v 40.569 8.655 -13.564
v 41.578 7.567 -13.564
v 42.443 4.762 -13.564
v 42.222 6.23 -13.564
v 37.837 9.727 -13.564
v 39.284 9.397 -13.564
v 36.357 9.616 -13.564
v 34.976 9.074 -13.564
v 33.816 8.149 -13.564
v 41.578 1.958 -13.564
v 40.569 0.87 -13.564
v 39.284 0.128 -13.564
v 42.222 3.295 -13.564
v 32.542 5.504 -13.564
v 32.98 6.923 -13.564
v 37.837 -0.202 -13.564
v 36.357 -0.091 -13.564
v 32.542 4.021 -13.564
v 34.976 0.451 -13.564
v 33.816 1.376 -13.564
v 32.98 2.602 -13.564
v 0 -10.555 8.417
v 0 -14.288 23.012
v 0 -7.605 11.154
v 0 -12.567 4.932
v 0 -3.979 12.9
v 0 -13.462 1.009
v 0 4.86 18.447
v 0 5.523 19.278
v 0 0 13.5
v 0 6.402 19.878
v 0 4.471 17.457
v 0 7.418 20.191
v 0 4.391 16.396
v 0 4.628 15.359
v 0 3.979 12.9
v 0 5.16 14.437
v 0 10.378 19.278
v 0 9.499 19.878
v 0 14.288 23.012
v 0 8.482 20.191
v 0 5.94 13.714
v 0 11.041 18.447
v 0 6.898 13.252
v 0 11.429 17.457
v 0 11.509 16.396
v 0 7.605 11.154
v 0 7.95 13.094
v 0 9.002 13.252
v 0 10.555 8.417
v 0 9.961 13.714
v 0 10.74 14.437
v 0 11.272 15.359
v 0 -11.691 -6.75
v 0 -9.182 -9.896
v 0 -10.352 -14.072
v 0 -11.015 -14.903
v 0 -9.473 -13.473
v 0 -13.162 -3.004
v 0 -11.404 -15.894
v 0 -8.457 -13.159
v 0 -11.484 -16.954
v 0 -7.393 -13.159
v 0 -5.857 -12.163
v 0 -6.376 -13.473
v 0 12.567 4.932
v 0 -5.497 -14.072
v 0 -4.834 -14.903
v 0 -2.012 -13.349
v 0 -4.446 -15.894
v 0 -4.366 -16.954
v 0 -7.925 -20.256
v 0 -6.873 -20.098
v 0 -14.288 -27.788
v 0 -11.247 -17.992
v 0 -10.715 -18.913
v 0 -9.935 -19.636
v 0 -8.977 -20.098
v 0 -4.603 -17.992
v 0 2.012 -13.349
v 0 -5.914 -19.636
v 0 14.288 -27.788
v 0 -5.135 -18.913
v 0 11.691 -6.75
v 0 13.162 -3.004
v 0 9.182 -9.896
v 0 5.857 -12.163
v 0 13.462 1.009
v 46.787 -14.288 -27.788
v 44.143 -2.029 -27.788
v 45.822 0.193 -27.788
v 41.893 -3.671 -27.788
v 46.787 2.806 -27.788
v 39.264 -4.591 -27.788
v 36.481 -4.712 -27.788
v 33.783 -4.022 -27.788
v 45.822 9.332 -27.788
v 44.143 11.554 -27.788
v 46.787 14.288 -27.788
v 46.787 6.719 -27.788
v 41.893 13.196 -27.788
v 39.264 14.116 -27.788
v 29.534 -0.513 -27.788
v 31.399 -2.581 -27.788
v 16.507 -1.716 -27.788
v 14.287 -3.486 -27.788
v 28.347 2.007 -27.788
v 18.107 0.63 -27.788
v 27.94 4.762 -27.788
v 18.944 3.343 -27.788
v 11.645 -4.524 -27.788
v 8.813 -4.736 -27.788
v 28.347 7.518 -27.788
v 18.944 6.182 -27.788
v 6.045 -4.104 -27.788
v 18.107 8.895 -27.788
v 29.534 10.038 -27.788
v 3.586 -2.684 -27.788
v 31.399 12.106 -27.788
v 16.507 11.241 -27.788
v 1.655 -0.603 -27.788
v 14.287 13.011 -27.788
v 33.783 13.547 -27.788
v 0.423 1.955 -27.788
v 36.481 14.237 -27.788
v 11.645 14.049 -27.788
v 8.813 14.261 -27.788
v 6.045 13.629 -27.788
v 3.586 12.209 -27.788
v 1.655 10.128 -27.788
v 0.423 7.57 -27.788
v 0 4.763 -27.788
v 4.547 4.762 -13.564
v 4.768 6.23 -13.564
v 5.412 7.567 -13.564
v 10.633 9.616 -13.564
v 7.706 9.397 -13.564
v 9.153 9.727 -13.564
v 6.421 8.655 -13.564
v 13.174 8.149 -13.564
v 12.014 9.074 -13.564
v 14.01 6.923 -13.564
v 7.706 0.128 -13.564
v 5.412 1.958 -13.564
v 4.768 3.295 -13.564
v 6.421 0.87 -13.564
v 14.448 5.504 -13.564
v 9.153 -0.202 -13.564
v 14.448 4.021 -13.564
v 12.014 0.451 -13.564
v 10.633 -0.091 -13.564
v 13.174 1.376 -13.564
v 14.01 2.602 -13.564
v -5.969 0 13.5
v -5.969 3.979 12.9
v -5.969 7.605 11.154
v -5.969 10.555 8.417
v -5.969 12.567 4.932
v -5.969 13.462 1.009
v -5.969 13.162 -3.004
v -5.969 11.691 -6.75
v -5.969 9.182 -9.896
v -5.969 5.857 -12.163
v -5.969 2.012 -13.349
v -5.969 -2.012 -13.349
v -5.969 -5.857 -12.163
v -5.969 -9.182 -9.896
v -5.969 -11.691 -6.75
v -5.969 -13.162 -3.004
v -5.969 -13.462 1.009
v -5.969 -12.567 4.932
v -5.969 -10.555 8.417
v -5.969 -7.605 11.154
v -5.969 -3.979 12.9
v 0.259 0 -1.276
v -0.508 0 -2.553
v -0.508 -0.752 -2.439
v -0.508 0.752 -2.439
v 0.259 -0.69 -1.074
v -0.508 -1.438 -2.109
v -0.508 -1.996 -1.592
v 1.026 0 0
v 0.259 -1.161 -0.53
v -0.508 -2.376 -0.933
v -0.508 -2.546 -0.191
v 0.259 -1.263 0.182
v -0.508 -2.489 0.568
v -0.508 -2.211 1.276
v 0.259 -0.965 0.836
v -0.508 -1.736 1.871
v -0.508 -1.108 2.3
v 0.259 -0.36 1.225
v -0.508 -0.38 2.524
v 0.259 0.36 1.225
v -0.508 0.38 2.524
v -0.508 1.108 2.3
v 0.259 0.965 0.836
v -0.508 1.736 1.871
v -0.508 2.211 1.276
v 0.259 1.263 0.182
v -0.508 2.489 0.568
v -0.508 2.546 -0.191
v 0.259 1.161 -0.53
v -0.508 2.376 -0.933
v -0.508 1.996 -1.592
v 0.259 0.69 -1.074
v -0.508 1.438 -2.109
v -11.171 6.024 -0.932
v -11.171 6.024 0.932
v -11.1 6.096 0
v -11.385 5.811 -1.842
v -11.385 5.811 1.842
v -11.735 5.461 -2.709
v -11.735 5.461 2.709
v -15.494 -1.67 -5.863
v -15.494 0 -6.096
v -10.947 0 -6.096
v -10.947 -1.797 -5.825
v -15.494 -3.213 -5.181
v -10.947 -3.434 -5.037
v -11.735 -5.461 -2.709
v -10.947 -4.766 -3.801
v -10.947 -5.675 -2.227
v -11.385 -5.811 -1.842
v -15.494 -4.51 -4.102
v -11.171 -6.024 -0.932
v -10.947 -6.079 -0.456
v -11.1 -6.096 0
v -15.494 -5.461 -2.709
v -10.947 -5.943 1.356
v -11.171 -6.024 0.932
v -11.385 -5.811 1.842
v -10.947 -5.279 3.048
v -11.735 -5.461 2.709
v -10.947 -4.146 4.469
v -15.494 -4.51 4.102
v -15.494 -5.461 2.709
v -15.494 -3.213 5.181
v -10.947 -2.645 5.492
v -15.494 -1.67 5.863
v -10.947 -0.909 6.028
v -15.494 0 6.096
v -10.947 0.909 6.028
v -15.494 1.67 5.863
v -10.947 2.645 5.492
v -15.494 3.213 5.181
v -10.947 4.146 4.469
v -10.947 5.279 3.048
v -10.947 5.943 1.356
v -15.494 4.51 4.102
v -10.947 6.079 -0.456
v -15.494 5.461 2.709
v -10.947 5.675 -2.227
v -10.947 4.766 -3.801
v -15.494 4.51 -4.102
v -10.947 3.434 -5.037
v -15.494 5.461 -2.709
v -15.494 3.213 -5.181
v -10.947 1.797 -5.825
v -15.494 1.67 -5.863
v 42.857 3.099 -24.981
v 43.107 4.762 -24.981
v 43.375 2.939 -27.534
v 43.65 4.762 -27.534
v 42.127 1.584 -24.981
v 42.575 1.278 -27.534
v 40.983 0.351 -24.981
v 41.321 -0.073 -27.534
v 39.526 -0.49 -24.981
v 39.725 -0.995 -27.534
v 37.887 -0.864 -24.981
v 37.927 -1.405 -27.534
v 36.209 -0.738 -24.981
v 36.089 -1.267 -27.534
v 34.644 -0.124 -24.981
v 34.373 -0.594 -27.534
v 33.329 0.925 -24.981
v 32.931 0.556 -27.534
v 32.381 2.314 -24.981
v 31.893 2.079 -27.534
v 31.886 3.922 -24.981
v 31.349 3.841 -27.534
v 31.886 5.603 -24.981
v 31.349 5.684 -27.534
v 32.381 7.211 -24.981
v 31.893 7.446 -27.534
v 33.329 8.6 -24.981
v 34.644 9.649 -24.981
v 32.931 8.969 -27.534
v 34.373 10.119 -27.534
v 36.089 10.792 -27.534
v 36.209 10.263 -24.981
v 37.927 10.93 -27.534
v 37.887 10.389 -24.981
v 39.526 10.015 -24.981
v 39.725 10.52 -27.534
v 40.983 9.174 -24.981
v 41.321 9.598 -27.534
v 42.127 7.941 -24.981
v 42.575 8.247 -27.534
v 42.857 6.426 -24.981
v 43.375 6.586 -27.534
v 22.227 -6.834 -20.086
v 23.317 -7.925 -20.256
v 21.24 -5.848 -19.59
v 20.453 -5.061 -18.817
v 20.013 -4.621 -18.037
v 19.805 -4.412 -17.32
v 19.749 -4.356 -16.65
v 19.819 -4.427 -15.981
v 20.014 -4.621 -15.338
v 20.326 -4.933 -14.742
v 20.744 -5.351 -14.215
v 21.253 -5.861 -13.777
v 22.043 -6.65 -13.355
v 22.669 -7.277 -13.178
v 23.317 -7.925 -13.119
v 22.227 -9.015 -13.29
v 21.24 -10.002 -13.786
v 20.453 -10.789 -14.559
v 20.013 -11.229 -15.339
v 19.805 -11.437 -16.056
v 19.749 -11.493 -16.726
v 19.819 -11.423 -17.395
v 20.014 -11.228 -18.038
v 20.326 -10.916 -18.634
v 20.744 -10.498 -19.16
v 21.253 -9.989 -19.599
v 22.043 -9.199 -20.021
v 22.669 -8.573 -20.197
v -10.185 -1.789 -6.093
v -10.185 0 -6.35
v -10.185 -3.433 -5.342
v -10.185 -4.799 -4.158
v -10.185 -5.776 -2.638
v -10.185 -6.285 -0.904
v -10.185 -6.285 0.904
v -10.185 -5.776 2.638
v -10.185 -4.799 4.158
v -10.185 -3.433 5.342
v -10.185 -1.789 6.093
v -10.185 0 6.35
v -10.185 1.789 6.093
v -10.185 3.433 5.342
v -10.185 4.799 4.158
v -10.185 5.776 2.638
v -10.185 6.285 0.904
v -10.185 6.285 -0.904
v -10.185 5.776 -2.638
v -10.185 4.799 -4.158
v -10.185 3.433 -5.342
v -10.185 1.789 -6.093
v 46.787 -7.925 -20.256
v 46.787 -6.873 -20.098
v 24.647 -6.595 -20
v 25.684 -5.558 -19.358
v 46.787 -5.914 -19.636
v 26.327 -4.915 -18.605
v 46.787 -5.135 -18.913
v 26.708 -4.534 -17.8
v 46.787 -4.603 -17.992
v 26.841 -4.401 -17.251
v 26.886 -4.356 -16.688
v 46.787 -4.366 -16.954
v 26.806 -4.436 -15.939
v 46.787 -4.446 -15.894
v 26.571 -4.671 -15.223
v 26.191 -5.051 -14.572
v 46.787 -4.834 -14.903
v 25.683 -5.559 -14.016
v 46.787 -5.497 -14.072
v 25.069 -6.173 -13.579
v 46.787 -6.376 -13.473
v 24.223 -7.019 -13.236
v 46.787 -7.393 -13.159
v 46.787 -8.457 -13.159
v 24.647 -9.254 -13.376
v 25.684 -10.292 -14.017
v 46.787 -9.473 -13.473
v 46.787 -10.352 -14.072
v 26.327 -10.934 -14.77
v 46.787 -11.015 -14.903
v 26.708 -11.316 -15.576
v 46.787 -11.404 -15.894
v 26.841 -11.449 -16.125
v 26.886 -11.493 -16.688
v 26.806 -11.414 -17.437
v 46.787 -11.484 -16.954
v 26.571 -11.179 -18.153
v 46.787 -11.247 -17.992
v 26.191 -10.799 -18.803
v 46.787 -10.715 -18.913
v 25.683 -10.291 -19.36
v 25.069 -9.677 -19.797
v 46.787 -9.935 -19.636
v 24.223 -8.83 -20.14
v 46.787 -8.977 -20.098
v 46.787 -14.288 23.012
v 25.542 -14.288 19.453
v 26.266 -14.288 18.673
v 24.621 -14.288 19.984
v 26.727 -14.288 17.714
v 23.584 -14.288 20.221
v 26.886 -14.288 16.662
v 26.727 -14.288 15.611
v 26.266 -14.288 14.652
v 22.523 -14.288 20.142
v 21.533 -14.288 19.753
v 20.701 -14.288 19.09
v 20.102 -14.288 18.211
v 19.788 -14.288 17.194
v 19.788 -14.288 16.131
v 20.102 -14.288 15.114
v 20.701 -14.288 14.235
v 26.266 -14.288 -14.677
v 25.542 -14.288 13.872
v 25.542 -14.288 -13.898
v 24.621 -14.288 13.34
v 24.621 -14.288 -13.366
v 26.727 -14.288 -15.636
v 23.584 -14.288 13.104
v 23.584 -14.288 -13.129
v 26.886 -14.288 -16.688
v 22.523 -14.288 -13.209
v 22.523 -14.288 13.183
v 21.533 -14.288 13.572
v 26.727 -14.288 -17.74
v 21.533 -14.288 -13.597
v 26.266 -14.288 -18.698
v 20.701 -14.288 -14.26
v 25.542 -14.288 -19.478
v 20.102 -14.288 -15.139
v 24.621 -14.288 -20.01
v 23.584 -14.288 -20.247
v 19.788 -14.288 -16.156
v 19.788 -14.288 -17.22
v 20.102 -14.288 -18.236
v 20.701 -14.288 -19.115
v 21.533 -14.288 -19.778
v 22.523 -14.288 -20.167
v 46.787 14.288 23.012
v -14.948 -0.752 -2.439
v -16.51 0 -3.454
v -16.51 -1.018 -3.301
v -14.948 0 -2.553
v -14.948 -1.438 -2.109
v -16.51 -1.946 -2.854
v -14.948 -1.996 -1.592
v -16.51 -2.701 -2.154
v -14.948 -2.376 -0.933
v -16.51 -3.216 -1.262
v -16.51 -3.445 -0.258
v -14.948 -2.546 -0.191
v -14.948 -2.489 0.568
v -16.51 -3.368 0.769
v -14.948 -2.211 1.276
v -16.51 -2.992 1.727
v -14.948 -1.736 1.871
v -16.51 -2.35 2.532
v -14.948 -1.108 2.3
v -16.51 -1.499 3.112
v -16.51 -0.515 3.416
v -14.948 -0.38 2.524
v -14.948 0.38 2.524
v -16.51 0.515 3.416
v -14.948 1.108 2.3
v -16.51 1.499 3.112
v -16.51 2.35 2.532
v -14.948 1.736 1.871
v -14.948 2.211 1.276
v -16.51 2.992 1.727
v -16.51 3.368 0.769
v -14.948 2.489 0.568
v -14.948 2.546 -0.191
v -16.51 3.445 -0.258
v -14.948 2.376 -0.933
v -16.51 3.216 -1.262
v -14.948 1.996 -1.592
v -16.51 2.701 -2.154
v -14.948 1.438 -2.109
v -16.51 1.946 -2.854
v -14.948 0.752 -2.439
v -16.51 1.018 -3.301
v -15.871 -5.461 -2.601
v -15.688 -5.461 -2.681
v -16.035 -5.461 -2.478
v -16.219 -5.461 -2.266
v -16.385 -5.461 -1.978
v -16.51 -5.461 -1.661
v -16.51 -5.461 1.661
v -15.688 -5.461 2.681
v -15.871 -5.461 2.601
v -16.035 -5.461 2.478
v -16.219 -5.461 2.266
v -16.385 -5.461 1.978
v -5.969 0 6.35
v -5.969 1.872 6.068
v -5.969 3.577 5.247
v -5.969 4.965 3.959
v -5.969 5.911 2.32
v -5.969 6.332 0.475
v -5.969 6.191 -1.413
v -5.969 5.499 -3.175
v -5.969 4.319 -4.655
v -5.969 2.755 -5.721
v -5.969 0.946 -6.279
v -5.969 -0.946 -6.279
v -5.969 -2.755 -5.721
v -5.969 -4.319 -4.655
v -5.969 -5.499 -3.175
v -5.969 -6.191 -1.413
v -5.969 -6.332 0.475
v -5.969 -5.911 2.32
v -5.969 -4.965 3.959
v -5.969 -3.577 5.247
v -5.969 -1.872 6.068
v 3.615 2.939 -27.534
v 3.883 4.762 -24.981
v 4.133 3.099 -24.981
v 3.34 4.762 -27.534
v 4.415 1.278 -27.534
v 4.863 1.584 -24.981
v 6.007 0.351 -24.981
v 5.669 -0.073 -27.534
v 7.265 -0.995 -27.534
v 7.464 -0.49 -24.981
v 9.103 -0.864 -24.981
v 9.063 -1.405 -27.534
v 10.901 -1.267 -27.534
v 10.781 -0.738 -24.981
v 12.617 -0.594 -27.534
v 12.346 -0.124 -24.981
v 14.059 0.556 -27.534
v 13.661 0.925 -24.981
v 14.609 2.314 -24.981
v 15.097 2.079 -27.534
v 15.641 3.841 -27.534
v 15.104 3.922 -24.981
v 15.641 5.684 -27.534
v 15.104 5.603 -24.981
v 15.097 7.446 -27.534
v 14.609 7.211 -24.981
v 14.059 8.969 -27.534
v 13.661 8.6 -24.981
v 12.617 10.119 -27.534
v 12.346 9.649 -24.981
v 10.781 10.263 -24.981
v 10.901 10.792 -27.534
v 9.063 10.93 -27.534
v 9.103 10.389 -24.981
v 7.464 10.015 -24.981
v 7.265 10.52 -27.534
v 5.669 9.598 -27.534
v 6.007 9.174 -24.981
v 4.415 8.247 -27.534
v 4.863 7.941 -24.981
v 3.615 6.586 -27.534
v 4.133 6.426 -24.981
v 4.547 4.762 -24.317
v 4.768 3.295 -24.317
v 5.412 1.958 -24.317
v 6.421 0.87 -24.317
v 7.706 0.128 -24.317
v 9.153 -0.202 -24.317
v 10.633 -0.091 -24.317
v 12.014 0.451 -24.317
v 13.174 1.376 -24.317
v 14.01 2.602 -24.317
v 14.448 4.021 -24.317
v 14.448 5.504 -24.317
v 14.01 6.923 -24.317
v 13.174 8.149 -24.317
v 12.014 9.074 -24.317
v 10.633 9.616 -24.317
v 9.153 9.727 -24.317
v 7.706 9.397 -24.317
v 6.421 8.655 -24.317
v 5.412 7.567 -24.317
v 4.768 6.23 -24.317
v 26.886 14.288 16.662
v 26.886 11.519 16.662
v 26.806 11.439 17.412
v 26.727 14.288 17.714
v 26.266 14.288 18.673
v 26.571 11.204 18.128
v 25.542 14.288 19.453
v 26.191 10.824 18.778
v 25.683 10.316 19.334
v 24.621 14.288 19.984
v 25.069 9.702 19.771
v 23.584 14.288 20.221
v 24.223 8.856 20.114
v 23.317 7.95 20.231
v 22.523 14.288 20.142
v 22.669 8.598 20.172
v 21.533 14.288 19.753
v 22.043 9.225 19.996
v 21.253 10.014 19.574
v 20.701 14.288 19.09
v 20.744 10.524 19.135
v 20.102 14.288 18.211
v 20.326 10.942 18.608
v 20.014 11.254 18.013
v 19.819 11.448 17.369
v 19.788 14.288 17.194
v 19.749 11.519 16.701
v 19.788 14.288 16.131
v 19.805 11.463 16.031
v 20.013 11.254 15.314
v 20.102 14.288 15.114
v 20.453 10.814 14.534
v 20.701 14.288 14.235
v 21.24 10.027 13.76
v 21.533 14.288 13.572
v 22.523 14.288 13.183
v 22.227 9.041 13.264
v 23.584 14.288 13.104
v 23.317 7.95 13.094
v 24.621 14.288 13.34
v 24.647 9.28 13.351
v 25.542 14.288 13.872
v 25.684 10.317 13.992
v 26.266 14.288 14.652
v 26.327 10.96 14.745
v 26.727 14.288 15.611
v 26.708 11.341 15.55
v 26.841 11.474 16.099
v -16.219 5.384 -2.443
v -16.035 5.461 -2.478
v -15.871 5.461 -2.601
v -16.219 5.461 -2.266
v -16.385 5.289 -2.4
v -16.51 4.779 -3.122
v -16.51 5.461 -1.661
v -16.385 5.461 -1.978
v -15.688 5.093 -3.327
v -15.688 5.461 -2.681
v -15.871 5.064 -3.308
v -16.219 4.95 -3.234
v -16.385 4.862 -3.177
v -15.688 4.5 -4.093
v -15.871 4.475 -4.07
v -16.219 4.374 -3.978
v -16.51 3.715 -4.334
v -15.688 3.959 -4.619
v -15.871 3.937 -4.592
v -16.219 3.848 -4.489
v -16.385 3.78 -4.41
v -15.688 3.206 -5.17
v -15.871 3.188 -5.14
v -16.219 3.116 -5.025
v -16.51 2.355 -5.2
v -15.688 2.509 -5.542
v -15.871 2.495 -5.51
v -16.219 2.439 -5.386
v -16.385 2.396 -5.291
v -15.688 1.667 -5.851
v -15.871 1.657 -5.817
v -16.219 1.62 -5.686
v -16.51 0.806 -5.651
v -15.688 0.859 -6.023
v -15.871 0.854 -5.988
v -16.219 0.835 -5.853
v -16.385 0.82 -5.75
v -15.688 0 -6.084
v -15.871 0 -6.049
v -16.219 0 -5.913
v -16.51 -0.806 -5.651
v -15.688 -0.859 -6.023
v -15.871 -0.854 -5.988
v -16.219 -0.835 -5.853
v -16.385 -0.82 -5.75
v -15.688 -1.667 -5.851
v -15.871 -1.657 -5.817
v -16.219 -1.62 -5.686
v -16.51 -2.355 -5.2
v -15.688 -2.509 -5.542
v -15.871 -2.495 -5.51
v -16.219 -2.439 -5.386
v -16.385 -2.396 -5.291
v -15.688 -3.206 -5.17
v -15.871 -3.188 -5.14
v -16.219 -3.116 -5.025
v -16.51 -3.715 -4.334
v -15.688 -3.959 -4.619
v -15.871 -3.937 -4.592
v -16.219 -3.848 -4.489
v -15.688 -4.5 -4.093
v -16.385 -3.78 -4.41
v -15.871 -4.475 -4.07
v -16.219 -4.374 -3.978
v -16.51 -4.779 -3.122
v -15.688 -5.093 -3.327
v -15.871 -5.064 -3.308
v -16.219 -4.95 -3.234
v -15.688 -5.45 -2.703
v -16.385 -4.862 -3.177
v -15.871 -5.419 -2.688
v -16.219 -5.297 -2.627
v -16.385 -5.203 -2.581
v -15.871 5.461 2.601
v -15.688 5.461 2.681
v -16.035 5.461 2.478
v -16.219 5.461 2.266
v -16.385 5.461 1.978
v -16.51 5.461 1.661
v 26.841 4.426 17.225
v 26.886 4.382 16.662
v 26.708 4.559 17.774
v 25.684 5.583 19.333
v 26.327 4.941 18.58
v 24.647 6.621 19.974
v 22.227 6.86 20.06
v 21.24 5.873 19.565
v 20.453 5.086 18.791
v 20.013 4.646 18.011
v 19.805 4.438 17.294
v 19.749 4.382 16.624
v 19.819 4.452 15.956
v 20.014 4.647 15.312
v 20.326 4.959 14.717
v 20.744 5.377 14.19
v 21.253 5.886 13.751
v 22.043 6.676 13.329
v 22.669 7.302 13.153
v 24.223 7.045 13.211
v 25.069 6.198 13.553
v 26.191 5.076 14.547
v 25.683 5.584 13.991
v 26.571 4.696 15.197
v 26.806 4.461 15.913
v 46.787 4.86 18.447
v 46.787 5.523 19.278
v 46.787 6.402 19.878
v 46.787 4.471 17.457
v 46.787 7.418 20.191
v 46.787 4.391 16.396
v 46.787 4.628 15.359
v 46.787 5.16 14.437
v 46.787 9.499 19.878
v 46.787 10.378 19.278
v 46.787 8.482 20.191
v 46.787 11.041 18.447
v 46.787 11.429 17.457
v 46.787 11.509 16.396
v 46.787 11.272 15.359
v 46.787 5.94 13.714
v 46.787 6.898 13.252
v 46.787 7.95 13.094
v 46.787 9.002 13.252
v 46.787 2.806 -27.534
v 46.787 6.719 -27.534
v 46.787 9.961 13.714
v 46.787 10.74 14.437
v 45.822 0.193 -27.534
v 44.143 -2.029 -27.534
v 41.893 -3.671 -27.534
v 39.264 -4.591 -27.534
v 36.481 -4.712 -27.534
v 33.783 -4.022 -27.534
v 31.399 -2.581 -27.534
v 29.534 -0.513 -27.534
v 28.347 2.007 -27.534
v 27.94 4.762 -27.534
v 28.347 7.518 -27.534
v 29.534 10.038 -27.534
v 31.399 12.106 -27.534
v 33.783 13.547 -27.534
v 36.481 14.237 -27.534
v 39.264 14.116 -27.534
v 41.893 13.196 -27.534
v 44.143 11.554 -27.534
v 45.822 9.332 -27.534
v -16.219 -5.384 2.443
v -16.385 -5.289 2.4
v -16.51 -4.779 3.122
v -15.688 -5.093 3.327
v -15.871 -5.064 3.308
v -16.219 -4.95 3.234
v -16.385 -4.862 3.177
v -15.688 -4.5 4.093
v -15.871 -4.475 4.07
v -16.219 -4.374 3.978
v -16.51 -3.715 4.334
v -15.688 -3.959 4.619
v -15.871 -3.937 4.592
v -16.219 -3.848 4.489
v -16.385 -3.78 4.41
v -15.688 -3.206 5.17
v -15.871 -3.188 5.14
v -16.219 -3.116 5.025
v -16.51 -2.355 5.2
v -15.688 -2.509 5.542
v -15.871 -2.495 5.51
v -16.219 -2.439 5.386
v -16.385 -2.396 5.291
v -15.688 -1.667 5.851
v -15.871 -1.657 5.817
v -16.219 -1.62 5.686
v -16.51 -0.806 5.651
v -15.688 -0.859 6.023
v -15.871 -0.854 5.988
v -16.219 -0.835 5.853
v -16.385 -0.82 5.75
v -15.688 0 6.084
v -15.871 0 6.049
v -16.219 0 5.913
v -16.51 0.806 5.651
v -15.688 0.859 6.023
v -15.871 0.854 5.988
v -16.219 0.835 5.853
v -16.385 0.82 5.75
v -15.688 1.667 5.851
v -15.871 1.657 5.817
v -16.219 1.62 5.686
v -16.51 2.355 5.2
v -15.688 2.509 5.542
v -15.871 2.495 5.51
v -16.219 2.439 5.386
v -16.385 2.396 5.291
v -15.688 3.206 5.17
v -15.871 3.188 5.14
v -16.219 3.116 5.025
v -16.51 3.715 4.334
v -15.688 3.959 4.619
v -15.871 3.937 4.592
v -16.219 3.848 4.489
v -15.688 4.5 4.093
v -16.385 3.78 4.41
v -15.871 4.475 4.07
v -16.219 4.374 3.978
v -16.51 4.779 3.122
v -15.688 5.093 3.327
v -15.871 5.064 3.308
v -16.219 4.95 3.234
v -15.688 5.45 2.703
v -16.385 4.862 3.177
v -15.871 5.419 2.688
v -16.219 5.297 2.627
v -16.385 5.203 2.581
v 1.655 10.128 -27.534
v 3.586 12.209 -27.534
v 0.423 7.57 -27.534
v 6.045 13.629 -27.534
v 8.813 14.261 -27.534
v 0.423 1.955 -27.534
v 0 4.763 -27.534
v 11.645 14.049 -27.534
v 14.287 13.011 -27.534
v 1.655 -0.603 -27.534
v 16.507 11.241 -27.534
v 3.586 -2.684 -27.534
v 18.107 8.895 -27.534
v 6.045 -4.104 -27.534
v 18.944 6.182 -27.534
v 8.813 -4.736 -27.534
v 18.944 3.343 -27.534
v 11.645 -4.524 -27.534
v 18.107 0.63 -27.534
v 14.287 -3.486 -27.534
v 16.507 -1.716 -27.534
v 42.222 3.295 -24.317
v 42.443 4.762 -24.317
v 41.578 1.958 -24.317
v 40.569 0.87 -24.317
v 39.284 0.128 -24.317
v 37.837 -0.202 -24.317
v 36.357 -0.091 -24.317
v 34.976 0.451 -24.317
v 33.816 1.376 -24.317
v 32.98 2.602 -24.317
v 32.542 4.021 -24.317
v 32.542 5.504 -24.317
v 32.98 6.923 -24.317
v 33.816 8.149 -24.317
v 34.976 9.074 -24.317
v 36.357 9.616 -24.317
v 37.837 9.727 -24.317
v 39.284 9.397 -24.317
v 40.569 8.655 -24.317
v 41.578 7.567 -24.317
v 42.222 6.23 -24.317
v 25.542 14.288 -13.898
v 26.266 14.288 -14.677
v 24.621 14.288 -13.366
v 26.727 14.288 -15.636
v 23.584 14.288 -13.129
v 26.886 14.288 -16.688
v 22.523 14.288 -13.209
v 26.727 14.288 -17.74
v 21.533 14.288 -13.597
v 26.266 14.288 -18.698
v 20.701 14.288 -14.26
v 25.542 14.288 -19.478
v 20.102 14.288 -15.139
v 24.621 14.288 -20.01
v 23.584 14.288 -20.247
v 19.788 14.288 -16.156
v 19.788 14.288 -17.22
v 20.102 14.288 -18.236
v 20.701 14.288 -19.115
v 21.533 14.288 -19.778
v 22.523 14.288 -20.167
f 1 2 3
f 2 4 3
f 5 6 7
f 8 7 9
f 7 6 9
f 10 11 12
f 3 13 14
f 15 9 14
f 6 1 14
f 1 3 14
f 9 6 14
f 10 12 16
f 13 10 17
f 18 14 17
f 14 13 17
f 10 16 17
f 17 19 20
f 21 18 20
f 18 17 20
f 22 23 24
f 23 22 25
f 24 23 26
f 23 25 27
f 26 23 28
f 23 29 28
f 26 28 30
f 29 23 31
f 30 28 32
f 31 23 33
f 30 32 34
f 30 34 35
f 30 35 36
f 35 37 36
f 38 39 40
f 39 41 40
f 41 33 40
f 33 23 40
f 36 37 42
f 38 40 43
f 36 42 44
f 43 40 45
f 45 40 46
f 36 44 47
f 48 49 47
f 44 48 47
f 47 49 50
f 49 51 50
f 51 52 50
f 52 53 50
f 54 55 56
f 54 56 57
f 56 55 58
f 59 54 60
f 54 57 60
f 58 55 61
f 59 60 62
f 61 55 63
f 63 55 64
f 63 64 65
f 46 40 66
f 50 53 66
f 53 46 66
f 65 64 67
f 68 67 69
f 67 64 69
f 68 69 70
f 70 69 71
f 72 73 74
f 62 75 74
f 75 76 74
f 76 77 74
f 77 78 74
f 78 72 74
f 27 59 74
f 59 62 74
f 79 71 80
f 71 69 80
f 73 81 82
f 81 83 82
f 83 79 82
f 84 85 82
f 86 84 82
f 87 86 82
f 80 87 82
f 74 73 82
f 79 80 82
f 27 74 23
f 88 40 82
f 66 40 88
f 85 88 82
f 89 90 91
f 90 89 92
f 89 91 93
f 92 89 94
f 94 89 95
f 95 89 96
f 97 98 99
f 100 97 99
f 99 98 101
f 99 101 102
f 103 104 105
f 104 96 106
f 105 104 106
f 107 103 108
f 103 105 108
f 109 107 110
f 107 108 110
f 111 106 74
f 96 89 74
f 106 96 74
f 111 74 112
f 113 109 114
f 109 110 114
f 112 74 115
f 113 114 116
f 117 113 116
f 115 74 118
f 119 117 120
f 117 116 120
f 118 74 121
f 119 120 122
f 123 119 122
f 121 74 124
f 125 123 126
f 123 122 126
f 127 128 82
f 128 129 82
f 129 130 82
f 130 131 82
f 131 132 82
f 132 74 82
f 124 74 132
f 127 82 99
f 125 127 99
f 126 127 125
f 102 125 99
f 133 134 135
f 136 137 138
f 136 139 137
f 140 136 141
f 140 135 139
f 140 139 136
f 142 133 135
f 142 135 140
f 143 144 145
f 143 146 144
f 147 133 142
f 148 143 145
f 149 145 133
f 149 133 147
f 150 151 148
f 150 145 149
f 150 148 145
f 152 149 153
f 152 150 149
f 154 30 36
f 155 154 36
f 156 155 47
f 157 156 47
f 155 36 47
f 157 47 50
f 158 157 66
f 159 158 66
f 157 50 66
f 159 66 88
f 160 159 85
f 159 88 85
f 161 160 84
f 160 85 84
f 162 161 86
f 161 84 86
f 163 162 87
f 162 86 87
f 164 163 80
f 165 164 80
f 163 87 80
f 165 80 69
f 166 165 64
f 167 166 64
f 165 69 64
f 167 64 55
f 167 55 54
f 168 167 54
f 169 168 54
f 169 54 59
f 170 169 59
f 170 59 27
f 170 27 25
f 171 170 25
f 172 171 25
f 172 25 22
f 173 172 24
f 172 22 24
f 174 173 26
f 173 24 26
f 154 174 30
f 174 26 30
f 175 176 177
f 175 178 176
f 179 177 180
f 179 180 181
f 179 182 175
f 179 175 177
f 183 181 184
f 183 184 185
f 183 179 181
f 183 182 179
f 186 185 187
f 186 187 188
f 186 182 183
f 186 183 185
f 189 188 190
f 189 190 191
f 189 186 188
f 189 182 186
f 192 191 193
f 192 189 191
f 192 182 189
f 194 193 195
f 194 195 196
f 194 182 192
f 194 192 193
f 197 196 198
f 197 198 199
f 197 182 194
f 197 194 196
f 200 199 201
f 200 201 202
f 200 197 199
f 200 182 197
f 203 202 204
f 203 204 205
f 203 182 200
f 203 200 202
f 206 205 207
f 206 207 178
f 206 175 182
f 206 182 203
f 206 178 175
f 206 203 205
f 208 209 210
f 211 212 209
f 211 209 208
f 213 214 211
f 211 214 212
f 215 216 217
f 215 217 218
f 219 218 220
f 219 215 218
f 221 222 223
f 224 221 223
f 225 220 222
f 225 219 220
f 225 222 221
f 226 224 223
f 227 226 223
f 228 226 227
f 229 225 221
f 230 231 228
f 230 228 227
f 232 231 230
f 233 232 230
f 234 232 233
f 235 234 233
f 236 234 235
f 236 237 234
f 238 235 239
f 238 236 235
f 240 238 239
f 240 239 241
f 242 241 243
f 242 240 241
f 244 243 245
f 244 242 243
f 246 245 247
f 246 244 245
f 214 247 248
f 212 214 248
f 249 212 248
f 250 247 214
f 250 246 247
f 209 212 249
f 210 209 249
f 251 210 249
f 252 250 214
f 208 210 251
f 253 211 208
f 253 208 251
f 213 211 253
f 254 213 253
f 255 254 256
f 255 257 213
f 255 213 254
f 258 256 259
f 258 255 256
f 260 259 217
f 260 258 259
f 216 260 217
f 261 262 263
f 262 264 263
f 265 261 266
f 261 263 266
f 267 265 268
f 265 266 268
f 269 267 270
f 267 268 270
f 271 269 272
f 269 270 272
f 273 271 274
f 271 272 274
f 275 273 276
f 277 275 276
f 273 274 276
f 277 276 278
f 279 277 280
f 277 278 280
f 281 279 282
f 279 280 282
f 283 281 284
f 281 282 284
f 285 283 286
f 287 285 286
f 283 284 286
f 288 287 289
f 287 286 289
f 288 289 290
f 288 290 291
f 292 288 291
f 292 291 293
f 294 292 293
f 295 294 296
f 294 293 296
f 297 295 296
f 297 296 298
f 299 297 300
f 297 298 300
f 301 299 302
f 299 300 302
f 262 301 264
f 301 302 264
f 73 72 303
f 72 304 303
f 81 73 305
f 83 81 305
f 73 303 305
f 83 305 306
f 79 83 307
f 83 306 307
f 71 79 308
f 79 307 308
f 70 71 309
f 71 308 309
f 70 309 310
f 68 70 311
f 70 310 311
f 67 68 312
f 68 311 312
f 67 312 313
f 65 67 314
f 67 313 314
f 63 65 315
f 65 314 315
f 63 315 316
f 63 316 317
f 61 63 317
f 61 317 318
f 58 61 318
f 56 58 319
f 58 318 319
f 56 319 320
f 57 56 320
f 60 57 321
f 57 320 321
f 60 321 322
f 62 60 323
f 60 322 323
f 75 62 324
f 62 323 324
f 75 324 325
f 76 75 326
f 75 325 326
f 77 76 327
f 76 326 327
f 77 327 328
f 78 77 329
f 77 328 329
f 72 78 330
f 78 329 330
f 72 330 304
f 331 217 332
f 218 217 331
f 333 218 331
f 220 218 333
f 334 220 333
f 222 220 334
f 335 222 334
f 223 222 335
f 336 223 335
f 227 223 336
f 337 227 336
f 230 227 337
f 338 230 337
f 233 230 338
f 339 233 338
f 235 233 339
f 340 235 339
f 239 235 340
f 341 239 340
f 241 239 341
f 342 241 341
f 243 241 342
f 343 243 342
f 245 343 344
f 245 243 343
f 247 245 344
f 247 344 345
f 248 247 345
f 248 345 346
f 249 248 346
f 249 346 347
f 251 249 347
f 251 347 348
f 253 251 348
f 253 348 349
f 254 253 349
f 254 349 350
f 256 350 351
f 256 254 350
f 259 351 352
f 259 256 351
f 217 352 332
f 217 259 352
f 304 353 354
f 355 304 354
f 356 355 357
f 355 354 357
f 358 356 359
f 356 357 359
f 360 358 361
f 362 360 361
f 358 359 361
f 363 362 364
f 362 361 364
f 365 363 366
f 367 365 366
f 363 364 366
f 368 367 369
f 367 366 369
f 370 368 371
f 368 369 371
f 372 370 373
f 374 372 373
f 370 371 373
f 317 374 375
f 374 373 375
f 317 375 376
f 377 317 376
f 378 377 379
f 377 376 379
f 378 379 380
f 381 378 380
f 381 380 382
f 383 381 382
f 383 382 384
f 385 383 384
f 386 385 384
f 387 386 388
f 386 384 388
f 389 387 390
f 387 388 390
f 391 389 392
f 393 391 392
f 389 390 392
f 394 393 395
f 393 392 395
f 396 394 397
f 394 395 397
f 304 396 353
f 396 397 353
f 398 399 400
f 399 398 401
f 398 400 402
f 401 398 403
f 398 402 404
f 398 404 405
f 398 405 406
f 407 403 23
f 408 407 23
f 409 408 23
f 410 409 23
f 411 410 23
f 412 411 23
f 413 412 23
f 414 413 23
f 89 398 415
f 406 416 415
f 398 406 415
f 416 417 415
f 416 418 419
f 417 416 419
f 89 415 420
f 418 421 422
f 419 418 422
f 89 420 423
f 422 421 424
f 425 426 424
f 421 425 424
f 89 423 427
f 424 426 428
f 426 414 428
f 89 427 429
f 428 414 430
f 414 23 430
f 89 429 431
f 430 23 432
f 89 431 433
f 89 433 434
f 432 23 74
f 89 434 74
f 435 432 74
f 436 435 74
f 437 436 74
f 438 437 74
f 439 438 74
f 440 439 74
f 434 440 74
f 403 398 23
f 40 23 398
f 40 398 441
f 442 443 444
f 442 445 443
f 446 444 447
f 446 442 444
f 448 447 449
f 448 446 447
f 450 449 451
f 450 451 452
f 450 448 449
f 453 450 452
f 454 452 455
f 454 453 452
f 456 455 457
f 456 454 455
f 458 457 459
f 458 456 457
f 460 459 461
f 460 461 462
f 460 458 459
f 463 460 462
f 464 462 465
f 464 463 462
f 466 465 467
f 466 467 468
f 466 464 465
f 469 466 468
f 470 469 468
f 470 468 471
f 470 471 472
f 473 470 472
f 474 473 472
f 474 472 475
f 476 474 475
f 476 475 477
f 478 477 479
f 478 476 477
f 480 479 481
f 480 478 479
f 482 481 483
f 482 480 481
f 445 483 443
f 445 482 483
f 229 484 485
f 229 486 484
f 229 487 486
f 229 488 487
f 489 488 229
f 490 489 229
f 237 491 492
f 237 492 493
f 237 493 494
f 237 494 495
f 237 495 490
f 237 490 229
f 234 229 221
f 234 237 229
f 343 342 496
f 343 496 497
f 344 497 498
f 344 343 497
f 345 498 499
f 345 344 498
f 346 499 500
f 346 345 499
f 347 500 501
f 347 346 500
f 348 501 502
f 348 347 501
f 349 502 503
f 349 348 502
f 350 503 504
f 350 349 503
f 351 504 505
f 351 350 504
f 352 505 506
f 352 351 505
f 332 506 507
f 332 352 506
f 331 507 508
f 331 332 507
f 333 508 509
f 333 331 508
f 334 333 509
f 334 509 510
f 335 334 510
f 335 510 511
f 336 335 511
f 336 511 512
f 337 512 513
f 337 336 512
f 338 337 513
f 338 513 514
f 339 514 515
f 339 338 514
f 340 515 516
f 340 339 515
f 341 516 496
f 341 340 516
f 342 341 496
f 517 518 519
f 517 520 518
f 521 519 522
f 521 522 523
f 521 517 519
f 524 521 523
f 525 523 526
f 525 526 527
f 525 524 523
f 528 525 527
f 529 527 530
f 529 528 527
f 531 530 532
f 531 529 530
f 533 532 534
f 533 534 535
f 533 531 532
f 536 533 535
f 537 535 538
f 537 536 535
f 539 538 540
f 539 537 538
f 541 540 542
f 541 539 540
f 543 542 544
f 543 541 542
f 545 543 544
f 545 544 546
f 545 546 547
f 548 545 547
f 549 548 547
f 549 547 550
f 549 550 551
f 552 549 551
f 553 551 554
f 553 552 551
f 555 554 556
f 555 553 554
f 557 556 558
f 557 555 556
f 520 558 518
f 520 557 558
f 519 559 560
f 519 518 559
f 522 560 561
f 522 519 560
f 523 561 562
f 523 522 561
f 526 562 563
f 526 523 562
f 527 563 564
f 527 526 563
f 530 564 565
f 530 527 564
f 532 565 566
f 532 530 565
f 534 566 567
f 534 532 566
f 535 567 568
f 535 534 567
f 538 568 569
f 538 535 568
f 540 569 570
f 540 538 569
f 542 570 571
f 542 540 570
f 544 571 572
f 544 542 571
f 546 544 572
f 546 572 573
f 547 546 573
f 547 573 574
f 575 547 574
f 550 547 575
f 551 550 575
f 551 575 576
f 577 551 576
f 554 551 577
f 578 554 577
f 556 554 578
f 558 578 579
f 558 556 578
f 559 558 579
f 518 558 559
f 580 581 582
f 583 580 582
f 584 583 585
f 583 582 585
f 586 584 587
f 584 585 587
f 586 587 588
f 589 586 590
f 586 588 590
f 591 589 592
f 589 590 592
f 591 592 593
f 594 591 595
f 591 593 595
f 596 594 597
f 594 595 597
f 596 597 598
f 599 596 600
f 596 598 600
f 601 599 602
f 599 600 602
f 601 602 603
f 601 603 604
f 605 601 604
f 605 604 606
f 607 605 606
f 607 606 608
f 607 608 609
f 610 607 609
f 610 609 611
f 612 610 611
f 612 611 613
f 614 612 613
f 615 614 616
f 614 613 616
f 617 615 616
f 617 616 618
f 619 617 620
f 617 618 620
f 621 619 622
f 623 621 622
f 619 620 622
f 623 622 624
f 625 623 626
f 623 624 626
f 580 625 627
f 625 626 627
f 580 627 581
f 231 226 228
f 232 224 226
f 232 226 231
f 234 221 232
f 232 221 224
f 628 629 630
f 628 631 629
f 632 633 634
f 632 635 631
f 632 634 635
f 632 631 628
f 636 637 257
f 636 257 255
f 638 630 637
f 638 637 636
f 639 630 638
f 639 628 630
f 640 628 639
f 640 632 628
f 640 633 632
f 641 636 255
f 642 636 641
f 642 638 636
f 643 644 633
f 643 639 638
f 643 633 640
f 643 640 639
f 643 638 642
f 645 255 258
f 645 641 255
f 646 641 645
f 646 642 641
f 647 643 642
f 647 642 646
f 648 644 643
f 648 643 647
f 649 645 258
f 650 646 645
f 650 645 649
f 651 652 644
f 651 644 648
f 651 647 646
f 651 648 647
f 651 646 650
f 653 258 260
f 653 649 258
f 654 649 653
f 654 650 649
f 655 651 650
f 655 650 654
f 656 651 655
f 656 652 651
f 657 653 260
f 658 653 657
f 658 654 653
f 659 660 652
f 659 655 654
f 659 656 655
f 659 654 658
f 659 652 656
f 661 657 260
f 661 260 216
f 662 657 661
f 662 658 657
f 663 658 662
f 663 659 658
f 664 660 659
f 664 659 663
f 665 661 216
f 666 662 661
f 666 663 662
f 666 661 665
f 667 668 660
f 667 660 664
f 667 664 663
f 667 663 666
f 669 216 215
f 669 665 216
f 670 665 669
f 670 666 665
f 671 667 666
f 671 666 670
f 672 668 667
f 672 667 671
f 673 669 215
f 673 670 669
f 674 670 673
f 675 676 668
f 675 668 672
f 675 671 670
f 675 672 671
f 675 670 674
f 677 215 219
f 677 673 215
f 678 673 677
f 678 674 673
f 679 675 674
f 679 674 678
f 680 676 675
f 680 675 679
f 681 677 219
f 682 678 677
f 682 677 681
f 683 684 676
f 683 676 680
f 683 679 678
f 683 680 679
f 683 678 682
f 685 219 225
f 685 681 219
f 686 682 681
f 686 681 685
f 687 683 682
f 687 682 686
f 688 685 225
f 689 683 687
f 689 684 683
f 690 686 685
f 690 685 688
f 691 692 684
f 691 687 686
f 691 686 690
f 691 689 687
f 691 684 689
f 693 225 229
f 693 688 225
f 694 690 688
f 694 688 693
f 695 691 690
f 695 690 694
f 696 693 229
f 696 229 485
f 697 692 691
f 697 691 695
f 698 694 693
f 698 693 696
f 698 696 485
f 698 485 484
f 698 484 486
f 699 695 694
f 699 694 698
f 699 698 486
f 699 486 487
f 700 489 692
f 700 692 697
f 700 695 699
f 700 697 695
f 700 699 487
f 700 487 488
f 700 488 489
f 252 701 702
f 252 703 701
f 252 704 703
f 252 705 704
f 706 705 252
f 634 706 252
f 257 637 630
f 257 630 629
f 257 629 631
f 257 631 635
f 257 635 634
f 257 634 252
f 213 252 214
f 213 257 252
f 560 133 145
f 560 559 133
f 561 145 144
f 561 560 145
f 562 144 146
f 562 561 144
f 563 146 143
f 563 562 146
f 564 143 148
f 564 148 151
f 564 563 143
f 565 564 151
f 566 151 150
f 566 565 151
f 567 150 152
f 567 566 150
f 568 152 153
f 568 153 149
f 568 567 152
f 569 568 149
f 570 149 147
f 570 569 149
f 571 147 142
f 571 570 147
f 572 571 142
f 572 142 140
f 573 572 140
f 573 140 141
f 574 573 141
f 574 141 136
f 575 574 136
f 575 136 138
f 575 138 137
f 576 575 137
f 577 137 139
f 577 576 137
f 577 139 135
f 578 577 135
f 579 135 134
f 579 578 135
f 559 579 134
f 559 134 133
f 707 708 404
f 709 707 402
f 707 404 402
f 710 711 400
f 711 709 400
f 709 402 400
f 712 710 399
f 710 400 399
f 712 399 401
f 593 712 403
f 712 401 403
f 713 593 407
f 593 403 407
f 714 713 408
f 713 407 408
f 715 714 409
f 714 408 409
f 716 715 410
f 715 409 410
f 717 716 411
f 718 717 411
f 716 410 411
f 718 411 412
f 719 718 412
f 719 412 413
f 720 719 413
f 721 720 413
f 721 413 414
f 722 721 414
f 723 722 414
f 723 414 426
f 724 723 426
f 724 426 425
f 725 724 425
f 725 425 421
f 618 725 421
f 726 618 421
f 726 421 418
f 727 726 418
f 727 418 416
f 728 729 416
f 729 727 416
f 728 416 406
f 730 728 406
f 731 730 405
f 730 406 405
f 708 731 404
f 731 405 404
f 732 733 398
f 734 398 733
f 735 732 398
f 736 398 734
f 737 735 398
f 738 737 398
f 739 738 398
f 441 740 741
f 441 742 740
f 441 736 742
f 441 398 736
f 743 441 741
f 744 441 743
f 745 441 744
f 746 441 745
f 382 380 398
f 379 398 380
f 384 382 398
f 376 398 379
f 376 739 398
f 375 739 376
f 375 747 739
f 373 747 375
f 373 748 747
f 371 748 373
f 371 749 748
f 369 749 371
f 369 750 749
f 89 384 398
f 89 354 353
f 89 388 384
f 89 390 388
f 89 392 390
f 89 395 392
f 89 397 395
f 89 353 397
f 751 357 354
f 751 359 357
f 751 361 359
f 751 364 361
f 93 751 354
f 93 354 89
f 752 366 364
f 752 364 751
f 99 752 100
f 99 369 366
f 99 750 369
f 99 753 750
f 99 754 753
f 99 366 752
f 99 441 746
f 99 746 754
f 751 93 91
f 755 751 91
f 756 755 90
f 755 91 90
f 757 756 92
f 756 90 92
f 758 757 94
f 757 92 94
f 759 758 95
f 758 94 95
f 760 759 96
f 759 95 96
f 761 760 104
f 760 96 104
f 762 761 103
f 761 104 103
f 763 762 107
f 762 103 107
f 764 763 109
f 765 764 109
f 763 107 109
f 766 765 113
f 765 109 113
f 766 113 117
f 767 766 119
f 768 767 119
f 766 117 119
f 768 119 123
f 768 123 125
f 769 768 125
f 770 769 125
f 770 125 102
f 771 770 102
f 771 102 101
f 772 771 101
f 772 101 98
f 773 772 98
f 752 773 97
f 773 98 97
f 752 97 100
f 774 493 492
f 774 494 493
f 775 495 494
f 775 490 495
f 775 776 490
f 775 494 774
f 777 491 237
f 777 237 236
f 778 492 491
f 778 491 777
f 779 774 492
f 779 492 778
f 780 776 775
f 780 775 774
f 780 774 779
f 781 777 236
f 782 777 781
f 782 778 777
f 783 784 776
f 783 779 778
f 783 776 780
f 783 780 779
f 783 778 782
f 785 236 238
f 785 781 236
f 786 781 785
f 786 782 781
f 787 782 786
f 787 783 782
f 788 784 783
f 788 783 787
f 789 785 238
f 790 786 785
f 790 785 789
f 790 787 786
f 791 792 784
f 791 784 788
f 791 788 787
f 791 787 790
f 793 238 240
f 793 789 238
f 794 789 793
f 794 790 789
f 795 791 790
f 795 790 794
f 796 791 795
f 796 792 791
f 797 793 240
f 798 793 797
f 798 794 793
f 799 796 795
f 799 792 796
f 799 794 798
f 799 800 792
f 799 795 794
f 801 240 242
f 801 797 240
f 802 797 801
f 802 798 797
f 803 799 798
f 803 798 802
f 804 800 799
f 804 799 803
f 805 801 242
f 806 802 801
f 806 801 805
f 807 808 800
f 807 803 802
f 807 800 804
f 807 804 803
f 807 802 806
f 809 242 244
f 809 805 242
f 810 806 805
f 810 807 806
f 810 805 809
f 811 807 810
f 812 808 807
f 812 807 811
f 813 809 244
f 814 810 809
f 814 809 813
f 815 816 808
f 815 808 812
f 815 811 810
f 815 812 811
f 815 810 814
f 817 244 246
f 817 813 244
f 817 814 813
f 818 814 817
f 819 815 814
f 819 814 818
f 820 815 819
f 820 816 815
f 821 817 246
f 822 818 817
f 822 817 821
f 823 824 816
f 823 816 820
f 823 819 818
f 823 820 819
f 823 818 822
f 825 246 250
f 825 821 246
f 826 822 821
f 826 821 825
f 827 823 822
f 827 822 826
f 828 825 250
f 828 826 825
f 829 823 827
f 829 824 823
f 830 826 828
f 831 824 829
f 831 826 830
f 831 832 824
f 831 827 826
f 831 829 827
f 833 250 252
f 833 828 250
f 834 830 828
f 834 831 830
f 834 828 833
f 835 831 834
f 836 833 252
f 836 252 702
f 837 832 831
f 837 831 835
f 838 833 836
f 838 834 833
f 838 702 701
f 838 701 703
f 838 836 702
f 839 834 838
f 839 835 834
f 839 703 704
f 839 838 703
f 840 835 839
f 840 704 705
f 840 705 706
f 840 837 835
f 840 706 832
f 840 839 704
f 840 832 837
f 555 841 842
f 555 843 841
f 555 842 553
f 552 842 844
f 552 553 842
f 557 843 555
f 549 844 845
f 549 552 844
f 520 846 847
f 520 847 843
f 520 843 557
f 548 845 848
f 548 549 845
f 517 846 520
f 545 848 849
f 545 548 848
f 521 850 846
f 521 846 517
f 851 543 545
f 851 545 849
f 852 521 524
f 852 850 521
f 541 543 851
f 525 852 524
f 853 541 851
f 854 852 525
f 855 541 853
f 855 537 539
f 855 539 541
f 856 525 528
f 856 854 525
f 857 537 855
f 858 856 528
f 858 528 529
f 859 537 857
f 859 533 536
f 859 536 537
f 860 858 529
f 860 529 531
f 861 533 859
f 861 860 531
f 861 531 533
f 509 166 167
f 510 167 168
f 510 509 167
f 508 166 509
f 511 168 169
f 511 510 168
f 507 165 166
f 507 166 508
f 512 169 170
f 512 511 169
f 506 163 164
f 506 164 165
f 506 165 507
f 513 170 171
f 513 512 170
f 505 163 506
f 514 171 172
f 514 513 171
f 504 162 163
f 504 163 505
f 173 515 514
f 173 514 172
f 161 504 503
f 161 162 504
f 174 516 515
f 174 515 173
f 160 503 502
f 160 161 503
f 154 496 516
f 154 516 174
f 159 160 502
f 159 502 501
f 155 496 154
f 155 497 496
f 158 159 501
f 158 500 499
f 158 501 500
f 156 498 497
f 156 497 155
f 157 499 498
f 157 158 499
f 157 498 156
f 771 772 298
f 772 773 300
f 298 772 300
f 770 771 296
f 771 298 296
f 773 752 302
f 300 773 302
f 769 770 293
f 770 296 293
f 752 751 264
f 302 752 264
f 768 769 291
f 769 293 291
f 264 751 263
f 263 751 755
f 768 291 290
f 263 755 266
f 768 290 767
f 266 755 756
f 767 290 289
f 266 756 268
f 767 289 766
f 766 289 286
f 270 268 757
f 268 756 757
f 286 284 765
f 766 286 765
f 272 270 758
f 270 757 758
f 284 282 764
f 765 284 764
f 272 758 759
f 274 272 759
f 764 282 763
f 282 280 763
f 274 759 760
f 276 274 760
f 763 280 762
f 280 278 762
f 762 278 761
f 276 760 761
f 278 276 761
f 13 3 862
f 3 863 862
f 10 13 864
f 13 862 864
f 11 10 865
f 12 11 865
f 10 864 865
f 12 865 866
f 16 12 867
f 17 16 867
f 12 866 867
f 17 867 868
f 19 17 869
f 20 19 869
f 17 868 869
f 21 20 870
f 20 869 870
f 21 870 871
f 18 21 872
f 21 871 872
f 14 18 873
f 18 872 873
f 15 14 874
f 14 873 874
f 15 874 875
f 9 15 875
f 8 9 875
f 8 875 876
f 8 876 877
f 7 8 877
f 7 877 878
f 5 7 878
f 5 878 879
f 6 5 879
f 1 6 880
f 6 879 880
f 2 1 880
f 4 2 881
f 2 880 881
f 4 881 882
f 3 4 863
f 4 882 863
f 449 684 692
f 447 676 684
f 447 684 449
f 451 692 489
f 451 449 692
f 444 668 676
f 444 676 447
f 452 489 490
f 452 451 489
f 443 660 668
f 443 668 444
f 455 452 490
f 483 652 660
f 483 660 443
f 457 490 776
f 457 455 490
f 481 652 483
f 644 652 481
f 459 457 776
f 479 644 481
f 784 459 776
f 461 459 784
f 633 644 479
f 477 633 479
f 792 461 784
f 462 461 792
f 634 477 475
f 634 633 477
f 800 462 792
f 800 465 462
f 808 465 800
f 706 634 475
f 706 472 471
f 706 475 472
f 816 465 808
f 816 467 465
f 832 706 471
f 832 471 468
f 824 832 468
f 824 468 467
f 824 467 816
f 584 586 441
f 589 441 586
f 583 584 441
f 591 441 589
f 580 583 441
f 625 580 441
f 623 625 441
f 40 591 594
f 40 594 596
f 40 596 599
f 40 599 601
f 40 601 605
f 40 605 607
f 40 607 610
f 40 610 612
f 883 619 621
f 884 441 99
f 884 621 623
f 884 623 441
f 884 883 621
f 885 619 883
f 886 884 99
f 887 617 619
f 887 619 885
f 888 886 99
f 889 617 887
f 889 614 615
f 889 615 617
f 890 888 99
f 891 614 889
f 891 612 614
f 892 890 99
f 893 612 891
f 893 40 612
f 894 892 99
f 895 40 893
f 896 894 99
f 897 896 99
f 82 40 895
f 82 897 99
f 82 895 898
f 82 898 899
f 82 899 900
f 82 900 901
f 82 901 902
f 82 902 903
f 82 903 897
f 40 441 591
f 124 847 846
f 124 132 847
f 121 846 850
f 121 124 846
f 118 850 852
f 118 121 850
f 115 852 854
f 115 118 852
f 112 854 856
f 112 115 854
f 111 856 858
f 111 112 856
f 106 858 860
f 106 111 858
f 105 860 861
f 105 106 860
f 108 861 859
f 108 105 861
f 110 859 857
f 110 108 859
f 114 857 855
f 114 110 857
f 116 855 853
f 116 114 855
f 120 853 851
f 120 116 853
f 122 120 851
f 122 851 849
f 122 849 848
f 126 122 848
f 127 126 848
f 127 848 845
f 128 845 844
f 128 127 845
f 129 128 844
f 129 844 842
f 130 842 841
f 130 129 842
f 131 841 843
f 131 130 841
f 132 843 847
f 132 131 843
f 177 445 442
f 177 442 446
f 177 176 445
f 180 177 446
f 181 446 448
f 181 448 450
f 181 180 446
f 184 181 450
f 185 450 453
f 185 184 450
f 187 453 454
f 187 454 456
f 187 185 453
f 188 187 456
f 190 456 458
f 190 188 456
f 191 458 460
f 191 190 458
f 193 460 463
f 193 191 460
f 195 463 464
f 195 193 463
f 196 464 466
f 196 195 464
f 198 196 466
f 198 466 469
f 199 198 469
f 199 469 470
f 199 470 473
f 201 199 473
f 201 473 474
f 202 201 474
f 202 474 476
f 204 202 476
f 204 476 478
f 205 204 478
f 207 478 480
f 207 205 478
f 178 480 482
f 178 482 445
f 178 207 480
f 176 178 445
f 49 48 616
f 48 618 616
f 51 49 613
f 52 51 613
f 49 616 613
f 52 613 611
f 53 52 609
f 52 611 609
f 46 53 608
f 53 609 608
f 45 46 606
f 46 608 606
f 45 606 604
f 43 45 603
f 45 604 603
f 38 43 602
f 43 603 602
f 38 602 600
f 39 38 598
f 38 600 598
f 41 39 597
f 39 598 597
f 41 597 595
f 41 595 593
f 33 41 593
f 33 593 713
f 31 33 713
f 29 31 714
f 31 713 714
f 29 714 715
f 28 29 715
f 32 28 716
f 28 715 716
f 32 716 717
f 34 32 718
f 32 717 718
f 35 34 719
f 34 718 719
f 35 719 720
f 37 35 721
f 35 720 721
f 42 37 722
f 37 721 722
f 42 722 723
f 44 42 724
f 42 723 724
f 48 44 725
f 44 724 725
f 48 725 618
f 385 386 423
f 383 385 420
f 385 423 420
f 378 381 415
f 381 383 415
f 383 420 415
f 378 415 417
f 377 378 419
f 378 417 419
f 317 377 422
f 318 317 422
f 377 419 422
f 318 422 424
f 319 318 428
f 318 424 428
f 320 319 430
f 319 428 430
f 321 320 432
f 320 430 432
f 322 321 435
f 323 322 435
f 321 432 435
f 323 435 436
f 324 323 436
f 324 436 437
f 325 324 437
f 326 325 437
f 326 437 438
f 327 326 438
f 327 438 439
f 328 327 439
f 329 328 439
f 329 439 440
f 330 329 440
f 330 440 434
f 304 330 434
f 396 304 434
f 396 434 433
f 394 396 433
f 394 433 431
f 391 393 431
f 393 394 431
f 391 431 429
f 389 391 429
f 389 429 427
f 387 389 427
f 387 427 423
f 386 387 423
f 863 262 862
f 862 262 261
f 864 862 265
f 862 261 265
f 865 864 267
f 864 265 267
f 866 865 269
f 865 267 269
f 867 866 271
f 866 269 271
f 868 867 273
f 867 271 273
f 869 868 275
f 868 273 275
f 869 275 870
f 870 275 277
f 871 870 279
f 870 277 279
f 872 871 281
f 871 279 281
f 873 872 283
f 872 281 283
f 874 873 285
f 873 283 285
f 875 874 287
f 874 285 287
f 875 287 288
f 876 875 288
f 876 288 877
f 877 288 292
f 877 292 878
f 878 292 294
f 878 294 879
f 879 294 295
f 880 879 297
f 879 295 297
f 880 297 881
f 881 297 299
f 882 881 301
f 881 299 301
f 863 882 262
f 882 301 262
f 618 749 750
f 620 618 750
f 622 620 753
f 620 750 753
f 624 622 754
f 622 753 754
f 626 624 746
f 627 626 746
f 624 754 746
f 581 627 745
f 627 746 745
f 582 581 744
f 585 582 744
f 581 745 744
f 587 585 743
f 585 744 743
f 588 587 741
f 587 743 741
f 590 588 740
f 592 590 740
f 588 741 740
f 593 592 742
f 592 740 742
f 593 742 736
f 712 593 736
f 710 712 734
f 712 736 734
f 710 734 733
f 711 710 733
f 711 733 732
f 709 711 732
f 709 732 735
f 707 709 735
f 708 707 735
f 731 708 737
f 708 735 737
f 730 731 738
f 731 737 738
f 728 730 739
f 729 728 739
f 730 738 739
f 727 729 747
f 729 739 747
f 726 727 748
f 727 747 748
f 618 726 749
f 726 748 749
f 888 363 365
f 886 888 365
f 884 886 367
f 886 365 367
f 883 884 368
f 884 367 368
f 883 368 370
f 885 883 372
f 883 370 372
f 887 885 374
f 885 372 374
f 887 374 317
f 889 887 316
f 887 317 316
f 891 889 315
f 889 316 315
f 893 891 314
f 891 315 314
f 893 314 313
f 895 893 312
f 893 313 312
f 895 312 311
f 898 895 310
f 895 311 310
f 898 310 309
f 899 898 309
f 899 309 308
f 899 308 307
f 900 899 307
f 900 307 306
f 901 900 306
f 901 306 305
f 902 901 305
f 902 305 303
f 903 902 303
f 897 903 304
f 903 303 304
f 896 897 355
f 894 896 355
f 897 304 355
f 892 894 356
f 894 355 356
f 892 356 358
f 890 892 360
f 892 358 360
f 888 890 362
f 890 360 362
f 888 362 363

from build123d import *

# Parameters (mm, degrees)
SKETCH1_W          = 50.8
SKETCH1_H          = 28.575
EXTRUDE1_DEPTH     = 46.7868
SKETCH5_R          = 13.5001
EXTRUDE2_DEPTH     = 5.969
SKETCH6_W          = 6.35
SKETCH6_H          = 10.541
CUT_EXTRUDE4_DEPTH = 30.48
HOLE1_D            = 7.1374
HOLE1_DEPTH        = 46.7868
HOLE2_D            = 7.1374
HOLE2_DEPTH        = 28.575


with BuildPart() as part:
    # Sketch1 → Extrude1 (new body)
    with BuildSketch(Plane(origin=(0, 0, 0), x_dir=(0, 0, -1), z_dir=(1, 0, 0))):
        with Locations((2.3876, 0)):
            Rectangle(SKETCH1_W, SKETCH1_H)
    extrude(amount=EXTRUDE1_DEPTH)

    # S2D0002 → Cut-Revolve1 (revolve, cut)
    with BuildSketch(Plane(origin=(0, 4.7625, 0), x_dir=(-1, 0, 0), z_dir=(0, 1, 0)), mode=Mode.PRIVATE) as cut_revolve1_sk:
        Polygon((-15.7099, -27.5336), (-19.0499873, -27.5336), (-19.0499873, -27.7876), (-9.525, -27.7876), (-9.525, -13.5636), (-14.5034, -13.5636), (-14.5034, -24.316993135), (-15.167306865, -24.9809), align=None)
    revolve(cut_revolve1_sk.sketch.rotate(Axis((9.525, 4.7625, -19.13842003), (0, 0, 1)), 180), axis=Axis((9.525, 4.7625, -19.13842003), (0, 0, 1)), mode=Mode.SUBTRACT)  # turned: the seam where the file's is

    # Sketch3 → Cut-Revolve2 (revolve, cut)
    with BuildSketch(Plane(origin=(41.148, 4.7625, -25.146), x_dir=(1, 0, 0), z_dir=(0, 1, 0))):
        Polygon((2.5019, 2.3876), (5.8419873, 2.3876), (5.8419873, 2.6416), (-3.683, 2.6416), (-3.683, -11.5824), (1.2954, -11.5824), (1.2954, -0.829006865), (1.959306865, -0.1651), align=None)
    revolve(axis=Axis((37.465, 4.7625, -3.189624441), (0, 0, -1)), mode=Mode.SUBTRACT)

    # Sketch5 → Extrude2 (add)
    with BuildSketch(Plane.ZY):
        Circle(SKETCH5_R)
    extrude(amount=EXTRUDE2_DEPTH)

    # Sketch6 → Revolve1 (revolve)
    with BuildSketch(Plane(origin=(0, 0, 0), x_dir=(0, 0, 1), z_dir=(0, -1, 0)), mode=Mode.PRIVATE) as revolve1_sk:
        with Locations((-3.175, 11.2395)):
            Rectangle(SKETCH6_W, SKETCH6_H)
    revolve(revolve1_sk.sketch.rotate(Axis((5.754582971, 0, 0), (-1, 0, 0)), 180), axis=Axis((5.754582971, 0, 0), (-1, 0, 0)))  # turned: the seam where the file's is

    # S2D0001 → Cut-Revolve4 (revolve, cut)
    with BuildSketch(Plane(origin=(-18.511260017, 3.2639, 0), x_dir=(0, 1, 0), z_dir=(0, 0, 1)), mode=Mode.PRIVATE) as cut_revolve4_sk:
        Polygon((-0.7112, -3.563050231), (-0.7112, -18.003260017), (-3.2639, -19.53707692), (-3.2639, -2.001260017), (0.1905, -2.001260017), align=None)
    revolve(cut_revolve4_sk.sketch.rotate(Axis((0, 0, 0), (-1, 0, 0)), 90), axis=Axis((0, 0, 0), (-1, 0, 0)), mode=Mode.SUBTRACT)  # turned: the seam where the file's is

    # Sketch8 → Cut-Revolve5 (revolve, cut)
    with BuildSketch(Plane(origin=(0, 0, 0), x_dir=(0, 0, -1), z_dir=(0, 1, 0)), mode=Mode.PRIVATE) as cut_revolve5_sk:
        with BuildLine():
            Line((-6.35, 10.1854), (-6.096, 10.9474))
            Line((-6.096, 10.9474), (-6.096, 15.494))
            ThreePointArc((-6.096, 15.494), (-5.995678675, 16.037796865), (-5.707922533, 16.51))
            Line((-5.707922533, 16.51), (-6.35, 16.51))
            Line((-6.35, 16.51), (-6.35, 10.1854))
        make_face()
    revolve(cut_revolve5_sk.sketch.rotate(Axis((-12.65936, 0, 0), (-1, 0, 0)), 180), axis=Axis((-12.65936, 0, 0), (-1, 0, 0)), mode=Mode.SUBTRACT)  # turned: the seam where the file's is

    # Sketch12 → Cut-Extrude4 (cut, symmetric)
    with BuildSketch(Plane(origin=(0, 0, 0), x_dir=(0, -1, 0), z_dir=(0, 0, -1))):
        Polygon((5.461, 16.51), (5.461, 11.7348), (6.096, 11.0998), (6.096, 16.51), align=None)
        Polygon((-5.461, 16.51), (-5.461, 11.7348), (-6.096, 11.0998), (-6.096, 16.51), align=None)
    extrude(amount=CUT_EXTRUDE4_DEPTH, both=True, mode=Mode.SUBTRACT)

    # Hole1
    with Locations(Plane.ZY):
        with Locations((-16.6878, -7.9248), (16.6624, 7.9502)):
            Hole(HOLE1_D / 2, depth=HOLE1_DEPTH)

    # Hole2
    with Locations(Plane(origin=(0, 14.2875, 0), x_dir=(-1, 0, 0), z_dir=(0, 1, 0))):
        with Locations((-23.3172, -16.6878), (-23.3172, 16.6624)):
            Hole(HOLE2_D / 2, depth=HOLE2_DEPTH)


solid = part.part
